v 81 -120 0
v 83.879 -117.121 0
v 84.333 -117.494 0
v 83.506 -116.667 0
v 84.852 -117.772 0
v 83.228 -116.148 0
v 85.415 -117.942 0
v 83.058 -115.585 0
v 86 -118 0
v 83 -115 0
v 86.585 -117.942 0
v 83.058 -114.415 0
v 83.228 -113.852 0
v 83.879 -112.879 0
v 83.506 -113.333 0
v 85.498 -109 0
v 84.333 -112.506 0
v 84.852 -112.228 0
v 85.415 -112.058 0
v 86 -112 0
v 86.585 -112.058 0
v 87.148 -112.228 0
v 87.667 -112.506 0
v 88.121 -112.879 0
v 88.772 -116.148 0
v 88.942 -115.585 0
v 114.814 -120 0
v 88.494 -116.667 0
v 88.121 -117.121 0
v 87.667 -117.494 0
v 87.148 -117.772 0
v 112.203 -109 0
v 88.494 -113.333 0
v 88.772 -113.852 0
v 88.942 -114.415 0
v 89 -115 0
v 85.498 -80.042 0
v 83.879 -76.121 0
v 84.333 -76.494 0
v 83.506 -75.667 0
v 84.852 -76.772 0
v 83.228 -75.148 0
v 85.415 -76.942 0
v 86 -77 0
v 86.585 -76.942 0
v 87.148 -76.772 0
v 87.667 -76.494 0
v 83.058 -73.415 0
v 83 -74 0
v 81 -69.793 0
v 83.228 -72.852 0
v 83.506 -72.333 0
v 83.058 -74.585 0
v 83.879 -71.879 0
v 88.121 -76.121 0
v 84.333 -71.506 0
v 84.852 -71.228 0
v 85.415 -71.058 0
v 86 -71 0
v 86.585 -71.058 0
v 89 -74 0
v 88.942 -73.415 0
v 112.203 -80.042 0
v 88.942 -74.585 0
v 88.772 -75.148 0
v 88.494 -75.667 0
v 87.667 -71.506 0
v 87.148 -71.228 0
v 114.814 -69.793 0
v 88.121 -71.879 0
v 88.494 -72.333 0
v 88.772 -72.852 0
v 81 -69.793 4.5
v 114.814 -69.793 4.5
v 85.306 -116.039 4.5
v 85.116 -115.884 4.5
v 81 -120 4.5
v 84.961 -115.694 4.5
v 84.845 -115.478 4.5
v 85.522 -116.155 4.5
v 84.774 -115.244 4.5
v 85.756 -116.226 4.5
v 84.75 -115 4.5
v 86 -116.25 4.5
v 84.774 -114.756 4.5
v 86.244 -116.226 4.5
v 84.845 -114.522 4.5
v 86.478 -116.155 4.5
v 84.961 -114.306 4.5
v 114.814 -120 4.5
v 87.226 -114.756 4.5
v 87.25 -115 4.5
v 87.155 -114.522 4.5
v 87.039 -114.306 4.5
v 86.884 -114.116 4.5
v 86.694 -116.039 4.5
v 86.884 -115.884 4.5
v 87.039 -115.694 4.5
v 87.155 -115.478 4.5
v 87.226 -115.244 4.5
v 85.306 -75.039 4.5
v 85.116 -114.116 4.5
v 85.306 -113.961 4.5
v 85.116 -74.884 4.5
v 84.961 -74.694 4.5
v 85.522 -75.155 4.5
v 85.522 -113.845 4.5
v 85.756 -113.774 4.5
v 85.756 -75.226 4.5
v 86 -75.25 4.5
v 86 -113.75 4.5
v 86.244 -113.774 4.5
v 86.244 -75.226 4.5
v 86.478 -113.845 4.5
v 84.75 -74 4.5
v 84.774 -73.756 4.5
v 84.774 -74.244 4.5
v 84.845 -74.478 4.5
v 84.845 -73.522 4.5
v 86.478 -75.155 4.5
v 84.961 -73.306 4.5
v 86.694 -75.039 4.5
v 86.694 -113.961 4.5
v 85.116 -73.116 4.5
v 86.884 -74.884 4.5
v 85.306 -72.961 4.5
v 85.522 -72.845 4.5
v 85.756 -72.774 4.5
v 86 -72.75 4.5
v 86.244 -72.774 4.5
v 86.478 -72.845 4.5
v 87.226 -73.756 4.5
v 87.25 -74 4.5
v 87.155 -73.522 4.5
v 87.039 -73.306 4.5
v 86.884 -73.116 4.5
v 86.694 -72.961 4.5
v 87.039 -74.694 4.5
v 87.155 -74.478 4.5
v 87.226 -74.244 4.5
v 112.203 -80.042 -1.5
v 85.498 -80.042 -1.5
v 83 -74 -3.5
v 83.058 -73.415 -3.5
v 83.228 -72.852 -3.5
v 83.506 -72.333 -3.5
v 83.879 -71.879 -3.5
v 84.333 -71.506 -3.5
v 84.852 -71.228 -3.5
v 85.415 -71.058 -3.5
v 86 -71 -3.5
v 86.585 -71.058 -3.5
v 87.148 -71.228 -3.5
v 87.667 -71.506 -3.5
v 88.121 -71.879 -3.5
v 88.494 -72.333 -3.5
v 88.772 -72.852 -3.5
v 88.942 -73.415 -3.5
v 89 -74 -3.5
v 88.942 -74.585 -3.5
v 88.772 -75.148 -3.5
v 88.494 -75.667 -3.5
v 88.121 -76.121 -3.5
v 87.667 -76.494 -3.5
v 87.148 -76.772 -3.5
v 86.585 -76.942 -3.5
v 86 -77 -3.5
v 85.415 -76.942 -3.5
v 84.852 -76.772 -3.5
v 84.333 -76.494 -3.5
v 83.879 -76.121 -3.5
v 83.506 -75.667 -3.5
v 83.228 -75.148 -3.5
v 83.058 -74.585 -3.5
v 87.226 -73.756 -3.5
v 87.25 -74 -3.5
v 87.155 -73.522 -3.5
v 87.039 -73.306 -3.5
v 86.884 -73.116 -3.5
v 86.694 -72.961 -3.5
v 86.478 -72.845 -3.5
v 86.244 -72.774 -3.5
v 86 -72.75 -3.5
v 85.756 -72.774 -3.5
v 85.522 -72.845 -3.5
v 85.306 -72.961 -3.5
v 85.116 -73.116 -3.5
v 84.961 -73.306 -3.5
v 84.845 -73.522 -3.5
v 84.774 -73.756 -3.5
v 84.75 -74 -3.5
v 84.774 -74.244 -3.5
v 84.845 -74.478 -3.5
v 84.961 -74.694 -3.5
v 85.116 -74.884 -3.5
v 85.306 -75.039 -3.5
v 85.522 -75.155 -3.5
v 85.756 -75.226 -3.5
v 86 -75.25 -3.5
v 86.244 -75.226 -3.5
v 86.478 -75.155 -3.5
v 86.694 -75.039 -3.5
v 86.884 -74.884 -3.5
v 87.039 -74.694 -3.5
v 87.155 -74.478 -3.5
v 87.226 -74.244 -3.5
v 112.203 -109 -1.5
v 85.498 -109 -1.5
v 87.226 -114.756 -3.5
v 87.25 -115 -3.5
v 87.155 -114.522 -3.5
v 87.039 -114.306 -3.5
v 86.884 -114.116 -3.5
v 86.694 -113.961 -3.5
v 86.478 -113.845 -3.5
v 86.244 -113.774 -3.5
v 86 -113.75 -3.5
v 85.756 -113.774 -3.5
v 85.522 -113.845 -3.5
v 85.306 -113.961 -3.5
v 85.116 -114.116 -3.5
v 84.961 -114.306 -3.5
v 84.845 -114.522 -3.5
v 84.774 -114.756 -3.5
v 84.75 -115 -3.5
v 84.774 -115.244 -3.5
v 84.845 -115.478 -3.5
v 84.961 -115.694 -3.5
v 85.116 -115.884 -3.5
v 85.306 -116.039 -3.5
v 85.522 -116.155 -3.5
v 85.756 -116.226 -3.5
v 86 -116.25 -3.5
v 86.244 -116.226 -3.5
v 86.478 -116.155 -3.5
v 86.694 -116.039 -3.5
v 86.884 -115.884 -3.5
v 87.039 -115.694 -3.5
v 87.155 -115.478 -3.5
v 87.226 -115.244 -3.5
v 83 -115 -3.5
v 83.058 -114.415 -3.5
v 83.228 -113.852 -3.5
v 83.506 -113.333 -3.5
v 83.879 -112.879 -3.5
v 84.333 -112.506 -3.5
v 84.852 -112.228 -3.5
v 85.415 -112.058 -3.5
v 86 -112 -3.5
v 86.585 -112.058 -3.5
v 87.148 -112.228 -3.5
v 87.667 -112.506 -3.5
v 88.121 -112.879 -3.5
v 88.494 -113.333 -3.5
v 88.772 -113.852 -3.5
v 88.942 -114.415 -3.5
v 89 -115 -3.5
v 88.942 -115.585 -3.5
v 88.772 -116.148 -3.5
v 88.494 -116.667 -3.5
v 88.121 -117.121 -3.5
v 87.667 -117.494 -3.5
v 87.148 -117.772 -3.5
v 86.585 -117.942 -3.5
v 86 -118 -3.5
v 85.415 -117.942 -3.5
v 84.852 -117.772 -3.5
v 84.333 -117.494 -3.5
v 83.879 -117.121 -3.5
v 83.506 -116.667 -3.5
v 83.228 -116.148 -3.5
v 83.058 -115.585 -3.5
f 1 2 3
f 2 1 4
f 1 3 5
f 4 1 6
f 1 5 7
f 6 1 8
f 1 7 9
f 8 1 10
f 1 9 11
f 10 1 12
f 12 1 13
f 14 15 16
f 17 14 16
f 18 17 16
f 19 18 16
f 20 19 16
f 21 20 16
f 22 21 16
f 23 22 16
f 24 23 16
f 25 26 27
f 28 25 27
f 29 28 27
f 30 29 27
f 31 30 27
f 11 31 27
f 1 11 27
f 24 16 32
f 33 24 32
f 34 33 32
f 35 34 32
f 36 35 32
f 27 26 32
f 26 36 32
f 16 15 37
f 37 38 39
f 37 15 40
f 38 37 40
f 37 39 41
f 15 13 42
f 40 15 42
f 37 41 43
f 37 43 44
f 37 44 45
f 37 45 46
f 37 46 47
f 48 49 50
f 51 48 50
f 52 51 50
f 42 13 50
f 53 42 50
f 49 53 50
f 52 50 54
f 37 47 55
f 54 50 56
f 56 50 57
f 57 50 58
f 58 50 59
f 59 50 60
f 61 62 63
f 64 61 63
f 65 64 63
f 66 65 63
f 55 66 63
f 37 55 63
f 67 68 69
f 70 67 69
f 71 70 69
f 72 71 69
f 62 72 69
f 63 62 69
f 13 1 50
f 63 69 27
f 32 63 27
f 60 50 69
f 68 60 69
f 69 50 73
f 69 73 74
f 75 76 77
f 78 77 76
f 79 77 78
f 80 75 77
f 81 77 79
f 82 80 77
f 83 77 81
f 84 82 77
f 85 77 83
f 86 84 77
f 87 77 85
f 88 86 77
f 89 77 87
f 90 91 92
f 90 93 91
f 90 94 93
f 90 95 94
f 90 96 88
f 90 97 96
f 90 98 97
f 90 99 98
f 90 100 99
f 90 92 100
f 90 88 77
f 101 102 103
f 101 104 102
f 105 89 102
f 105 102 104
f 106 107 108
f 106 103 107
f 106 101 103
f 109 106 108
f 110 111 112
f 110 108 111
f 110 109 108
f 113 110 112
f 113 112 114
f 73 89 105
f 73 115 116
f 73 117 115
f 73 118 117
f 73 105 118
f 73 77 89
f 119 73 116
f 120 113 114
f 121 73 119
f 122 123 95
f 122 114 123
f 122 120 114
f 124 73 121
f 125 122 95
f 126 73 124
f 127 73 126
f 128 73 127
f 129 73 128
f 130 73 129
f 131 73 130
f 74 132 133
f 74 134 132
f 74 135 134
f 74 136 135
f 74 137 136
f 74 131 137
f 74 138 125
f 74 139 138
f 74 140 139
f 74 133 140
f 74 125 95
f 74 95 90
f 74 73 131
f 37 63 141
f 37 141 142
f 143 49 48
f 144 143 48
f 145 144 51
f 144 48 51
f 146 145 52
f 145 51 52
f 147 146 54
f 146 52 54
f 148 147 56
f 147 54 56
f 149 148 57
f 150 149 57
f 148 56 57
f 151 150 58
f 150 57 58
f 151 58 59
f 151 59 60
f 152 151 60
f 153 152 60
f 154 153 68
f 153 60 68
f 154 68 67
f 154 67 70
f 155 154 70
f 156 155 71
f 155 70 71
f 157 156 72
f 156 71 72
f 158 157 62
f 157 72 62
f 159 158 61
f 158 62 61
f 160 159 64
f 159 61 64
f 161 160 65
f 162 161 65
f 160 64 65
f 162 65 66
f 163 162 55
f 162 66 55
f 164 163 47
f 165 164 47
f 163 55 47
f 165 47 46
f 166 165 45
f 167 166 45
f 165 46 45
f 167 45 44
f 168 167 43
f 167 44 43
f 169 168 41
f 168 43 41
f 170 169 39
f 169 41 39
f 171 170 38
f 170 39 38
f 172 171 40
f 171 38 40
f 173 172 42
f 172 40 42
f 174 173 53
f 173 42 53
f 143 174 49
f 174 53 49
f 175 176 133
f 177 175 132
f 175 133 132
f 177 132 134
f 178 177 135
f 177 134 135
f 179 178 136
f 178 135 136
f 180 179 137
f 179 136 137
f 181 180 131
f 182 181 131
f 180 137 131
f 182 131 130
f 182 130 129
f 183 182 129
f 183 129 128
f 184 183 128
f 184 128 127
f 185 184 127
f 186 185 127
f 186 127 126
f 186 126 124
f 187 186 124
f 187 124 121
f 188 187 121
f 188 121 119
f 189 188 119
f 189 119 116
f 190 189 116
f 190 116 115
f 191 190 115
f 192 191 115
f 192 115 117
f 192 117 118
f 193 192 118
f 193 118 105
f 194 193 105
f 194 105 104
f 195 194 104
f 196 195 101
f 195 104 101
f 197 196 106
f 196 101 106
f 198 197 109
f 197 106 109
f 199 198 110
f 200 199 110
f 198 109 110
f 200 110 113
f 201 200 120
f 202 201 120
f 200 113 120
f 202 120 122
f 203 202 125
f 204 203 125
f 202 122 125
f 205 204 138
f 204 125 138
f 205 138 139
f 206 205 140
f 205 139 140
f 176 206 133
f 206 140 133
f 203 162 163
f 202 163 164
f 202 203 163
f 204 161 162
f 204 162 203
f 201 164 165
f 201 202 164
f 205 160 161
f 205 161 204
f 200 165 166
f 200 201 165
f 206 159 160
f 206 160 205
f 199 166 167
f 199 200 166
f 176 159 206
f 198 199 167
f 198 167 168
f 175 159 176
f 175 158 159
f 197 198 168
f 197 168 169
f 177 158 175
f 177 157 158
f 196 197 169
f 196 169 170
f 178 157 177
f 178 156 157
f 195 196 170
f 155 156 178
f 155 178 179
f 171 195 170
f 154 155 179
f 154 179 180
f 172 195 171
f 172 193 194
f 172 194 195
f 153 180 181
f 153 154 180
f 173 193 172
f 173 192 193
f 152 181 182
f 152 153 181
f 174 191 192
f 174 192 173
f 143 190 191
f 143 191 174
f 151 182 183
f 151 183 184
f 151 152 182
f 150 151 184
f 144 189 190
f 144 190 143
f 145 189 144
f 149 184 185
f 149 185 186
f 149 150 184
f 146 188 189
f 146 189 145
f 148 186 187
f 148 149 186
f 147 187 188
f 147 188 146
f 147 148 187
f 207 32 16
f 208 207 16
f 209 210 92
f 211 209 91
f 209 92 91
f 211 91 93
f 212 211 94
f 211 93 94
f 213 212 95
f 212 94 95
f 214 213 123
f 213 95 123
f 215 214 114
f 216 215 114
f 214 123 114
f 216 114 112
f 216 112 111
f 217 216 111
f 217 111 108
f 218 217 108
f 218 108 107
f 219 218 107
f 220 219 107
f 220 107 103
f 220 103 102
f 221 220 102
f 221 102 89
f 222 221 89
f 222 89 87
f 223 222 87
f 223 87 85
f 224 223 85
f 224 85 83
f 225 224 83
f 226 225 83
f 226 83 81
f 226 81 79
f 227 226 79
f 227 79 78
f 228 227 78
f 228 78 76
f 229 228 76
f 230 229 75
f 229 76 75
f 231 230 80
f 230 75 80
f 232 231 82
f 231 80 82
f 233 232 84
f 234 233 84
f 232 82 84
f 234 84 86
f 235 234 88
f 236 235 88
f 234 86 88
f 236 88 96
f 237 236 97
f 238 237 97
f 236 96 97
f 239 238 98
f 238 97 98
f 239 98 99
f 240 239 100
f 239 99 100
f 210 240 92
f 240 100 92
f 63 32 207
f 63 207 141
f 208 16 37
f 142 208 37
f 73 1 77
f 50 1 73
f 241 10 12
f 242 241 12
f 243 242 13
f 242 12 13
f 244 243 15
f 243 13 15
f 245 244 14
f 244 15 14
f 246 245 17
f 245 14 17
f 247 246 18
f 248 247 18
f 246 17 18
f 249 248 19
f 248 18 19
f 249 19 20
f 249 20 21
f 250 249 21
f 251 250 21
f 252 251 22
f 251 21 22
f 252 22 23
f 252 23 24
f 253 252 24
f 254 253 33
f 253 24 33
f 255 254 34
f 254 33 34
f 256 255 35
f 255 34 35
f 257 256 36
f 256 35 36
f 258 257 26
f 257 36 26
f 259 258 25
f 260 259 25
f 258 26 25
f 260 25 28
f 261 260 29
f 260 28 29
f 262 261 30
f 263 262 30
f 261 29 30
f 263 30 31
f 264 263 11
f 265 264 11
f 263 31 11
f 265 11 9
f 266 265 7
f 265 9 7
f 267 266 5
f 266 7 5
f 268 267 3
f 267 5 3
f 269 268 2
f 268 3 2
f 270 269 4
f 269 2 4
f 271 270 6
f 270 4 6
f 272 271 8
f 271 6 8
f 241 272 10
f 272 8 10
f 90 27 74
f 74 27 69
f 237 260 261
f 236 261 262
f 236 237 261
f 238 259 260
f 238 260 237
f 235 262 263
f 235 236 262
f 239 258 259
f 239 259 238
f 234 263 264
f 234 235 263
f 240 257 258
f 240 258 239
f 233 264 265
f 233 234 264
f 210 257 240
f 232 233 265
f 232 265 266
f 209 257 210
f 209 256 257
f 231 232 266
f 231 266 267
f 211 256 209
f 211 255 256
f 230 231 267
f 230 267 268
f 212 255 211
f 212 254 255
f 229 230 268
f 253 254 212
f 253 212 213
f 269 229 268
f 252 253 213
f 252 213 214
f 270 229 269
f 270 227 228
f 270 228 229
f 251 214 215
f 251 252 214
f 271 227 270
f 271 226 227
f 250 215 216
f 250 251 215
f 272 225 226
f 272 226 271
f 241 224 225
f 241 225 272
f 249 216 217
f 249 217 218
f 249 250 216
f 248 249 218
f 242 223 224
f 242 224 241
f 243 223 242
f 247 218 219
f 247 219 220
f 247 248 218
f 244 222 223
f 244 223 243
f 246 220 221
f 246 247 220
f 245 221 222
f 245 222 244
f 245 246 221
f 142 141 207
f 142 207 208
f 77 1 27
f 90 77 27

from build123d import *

# Parameters (mm, degrees)
ESQUISSE2_W            = 33.813849949
ESQUISSE2_H            = 50.207047895
BOSS_EXTRU_1_DEPTH     = 4.5
ESQUISSE6_W            = 26.70455913
ESQUISSE6_H            = 28.958
BOSS_EXTRU_ASICS_DEPTH = 1.5
ESQUISSE7_R            = 3
BOSS_EXTRU_FIXS_DEPTH  = 3.5
TROU_TARAUD_M31_D      = 2.5
TROU_TARAUD_M31_DEPTH  = 8


with BuildPart() as part:
    # Esquisse2 → Boss.-Extru.1 (new body)
    with BuildSketch(Plane.XY):
        with Locations((97.906924975, -94.896476053)):
            Rectangle(ESQUISSE2_W, ESQUISSE2_H)
    extrude(amount=BOSS_EXTRU_1_DEPTH)

    # Esquisse6 → Boss.-Extru. ASICs (add)
    with BuildSketch(Plane(origin=(0, 0, 0), x_dir=(-1, 0, 0), z_dir=(0, 0, -1))):
        with Locations((-98.850279565, -94.521)):
            Rectangle(ESQUISSE6_W, ESQUISSE6_H)
    extrude(amount=BOSS_EXTRU_ASICS_DEPTH)

    # Esquisse7 → Boss.-Extru. FIXs (add)
    with BuildSketch(Plane(origin=(0, 0, 0), x_dir=(-1, 0, 0), z_dir=(0, 0, -1))):
        with Locations((-86, -74)):
            Circle(ESQUISSE7_R)
        with Locations((-86, -115)):
            Circle(ESQUISSE7_R)
    extrude(amount=BOSS_EXTRU_FIXS_DEPTH)

    # Trou taraudé M31
    with Locations(Plane(origin=(0, 0, -3.5), x_dir=(-1, 0, 0), z_dir=(0, 0, -1))):
        with Locations((-86, -74), (-86, -115)):
            Hole(TROU_TARAUD_M31_D / 2, depth=TROU_TARAUD_M31_DEPTH)


solid = part.part
